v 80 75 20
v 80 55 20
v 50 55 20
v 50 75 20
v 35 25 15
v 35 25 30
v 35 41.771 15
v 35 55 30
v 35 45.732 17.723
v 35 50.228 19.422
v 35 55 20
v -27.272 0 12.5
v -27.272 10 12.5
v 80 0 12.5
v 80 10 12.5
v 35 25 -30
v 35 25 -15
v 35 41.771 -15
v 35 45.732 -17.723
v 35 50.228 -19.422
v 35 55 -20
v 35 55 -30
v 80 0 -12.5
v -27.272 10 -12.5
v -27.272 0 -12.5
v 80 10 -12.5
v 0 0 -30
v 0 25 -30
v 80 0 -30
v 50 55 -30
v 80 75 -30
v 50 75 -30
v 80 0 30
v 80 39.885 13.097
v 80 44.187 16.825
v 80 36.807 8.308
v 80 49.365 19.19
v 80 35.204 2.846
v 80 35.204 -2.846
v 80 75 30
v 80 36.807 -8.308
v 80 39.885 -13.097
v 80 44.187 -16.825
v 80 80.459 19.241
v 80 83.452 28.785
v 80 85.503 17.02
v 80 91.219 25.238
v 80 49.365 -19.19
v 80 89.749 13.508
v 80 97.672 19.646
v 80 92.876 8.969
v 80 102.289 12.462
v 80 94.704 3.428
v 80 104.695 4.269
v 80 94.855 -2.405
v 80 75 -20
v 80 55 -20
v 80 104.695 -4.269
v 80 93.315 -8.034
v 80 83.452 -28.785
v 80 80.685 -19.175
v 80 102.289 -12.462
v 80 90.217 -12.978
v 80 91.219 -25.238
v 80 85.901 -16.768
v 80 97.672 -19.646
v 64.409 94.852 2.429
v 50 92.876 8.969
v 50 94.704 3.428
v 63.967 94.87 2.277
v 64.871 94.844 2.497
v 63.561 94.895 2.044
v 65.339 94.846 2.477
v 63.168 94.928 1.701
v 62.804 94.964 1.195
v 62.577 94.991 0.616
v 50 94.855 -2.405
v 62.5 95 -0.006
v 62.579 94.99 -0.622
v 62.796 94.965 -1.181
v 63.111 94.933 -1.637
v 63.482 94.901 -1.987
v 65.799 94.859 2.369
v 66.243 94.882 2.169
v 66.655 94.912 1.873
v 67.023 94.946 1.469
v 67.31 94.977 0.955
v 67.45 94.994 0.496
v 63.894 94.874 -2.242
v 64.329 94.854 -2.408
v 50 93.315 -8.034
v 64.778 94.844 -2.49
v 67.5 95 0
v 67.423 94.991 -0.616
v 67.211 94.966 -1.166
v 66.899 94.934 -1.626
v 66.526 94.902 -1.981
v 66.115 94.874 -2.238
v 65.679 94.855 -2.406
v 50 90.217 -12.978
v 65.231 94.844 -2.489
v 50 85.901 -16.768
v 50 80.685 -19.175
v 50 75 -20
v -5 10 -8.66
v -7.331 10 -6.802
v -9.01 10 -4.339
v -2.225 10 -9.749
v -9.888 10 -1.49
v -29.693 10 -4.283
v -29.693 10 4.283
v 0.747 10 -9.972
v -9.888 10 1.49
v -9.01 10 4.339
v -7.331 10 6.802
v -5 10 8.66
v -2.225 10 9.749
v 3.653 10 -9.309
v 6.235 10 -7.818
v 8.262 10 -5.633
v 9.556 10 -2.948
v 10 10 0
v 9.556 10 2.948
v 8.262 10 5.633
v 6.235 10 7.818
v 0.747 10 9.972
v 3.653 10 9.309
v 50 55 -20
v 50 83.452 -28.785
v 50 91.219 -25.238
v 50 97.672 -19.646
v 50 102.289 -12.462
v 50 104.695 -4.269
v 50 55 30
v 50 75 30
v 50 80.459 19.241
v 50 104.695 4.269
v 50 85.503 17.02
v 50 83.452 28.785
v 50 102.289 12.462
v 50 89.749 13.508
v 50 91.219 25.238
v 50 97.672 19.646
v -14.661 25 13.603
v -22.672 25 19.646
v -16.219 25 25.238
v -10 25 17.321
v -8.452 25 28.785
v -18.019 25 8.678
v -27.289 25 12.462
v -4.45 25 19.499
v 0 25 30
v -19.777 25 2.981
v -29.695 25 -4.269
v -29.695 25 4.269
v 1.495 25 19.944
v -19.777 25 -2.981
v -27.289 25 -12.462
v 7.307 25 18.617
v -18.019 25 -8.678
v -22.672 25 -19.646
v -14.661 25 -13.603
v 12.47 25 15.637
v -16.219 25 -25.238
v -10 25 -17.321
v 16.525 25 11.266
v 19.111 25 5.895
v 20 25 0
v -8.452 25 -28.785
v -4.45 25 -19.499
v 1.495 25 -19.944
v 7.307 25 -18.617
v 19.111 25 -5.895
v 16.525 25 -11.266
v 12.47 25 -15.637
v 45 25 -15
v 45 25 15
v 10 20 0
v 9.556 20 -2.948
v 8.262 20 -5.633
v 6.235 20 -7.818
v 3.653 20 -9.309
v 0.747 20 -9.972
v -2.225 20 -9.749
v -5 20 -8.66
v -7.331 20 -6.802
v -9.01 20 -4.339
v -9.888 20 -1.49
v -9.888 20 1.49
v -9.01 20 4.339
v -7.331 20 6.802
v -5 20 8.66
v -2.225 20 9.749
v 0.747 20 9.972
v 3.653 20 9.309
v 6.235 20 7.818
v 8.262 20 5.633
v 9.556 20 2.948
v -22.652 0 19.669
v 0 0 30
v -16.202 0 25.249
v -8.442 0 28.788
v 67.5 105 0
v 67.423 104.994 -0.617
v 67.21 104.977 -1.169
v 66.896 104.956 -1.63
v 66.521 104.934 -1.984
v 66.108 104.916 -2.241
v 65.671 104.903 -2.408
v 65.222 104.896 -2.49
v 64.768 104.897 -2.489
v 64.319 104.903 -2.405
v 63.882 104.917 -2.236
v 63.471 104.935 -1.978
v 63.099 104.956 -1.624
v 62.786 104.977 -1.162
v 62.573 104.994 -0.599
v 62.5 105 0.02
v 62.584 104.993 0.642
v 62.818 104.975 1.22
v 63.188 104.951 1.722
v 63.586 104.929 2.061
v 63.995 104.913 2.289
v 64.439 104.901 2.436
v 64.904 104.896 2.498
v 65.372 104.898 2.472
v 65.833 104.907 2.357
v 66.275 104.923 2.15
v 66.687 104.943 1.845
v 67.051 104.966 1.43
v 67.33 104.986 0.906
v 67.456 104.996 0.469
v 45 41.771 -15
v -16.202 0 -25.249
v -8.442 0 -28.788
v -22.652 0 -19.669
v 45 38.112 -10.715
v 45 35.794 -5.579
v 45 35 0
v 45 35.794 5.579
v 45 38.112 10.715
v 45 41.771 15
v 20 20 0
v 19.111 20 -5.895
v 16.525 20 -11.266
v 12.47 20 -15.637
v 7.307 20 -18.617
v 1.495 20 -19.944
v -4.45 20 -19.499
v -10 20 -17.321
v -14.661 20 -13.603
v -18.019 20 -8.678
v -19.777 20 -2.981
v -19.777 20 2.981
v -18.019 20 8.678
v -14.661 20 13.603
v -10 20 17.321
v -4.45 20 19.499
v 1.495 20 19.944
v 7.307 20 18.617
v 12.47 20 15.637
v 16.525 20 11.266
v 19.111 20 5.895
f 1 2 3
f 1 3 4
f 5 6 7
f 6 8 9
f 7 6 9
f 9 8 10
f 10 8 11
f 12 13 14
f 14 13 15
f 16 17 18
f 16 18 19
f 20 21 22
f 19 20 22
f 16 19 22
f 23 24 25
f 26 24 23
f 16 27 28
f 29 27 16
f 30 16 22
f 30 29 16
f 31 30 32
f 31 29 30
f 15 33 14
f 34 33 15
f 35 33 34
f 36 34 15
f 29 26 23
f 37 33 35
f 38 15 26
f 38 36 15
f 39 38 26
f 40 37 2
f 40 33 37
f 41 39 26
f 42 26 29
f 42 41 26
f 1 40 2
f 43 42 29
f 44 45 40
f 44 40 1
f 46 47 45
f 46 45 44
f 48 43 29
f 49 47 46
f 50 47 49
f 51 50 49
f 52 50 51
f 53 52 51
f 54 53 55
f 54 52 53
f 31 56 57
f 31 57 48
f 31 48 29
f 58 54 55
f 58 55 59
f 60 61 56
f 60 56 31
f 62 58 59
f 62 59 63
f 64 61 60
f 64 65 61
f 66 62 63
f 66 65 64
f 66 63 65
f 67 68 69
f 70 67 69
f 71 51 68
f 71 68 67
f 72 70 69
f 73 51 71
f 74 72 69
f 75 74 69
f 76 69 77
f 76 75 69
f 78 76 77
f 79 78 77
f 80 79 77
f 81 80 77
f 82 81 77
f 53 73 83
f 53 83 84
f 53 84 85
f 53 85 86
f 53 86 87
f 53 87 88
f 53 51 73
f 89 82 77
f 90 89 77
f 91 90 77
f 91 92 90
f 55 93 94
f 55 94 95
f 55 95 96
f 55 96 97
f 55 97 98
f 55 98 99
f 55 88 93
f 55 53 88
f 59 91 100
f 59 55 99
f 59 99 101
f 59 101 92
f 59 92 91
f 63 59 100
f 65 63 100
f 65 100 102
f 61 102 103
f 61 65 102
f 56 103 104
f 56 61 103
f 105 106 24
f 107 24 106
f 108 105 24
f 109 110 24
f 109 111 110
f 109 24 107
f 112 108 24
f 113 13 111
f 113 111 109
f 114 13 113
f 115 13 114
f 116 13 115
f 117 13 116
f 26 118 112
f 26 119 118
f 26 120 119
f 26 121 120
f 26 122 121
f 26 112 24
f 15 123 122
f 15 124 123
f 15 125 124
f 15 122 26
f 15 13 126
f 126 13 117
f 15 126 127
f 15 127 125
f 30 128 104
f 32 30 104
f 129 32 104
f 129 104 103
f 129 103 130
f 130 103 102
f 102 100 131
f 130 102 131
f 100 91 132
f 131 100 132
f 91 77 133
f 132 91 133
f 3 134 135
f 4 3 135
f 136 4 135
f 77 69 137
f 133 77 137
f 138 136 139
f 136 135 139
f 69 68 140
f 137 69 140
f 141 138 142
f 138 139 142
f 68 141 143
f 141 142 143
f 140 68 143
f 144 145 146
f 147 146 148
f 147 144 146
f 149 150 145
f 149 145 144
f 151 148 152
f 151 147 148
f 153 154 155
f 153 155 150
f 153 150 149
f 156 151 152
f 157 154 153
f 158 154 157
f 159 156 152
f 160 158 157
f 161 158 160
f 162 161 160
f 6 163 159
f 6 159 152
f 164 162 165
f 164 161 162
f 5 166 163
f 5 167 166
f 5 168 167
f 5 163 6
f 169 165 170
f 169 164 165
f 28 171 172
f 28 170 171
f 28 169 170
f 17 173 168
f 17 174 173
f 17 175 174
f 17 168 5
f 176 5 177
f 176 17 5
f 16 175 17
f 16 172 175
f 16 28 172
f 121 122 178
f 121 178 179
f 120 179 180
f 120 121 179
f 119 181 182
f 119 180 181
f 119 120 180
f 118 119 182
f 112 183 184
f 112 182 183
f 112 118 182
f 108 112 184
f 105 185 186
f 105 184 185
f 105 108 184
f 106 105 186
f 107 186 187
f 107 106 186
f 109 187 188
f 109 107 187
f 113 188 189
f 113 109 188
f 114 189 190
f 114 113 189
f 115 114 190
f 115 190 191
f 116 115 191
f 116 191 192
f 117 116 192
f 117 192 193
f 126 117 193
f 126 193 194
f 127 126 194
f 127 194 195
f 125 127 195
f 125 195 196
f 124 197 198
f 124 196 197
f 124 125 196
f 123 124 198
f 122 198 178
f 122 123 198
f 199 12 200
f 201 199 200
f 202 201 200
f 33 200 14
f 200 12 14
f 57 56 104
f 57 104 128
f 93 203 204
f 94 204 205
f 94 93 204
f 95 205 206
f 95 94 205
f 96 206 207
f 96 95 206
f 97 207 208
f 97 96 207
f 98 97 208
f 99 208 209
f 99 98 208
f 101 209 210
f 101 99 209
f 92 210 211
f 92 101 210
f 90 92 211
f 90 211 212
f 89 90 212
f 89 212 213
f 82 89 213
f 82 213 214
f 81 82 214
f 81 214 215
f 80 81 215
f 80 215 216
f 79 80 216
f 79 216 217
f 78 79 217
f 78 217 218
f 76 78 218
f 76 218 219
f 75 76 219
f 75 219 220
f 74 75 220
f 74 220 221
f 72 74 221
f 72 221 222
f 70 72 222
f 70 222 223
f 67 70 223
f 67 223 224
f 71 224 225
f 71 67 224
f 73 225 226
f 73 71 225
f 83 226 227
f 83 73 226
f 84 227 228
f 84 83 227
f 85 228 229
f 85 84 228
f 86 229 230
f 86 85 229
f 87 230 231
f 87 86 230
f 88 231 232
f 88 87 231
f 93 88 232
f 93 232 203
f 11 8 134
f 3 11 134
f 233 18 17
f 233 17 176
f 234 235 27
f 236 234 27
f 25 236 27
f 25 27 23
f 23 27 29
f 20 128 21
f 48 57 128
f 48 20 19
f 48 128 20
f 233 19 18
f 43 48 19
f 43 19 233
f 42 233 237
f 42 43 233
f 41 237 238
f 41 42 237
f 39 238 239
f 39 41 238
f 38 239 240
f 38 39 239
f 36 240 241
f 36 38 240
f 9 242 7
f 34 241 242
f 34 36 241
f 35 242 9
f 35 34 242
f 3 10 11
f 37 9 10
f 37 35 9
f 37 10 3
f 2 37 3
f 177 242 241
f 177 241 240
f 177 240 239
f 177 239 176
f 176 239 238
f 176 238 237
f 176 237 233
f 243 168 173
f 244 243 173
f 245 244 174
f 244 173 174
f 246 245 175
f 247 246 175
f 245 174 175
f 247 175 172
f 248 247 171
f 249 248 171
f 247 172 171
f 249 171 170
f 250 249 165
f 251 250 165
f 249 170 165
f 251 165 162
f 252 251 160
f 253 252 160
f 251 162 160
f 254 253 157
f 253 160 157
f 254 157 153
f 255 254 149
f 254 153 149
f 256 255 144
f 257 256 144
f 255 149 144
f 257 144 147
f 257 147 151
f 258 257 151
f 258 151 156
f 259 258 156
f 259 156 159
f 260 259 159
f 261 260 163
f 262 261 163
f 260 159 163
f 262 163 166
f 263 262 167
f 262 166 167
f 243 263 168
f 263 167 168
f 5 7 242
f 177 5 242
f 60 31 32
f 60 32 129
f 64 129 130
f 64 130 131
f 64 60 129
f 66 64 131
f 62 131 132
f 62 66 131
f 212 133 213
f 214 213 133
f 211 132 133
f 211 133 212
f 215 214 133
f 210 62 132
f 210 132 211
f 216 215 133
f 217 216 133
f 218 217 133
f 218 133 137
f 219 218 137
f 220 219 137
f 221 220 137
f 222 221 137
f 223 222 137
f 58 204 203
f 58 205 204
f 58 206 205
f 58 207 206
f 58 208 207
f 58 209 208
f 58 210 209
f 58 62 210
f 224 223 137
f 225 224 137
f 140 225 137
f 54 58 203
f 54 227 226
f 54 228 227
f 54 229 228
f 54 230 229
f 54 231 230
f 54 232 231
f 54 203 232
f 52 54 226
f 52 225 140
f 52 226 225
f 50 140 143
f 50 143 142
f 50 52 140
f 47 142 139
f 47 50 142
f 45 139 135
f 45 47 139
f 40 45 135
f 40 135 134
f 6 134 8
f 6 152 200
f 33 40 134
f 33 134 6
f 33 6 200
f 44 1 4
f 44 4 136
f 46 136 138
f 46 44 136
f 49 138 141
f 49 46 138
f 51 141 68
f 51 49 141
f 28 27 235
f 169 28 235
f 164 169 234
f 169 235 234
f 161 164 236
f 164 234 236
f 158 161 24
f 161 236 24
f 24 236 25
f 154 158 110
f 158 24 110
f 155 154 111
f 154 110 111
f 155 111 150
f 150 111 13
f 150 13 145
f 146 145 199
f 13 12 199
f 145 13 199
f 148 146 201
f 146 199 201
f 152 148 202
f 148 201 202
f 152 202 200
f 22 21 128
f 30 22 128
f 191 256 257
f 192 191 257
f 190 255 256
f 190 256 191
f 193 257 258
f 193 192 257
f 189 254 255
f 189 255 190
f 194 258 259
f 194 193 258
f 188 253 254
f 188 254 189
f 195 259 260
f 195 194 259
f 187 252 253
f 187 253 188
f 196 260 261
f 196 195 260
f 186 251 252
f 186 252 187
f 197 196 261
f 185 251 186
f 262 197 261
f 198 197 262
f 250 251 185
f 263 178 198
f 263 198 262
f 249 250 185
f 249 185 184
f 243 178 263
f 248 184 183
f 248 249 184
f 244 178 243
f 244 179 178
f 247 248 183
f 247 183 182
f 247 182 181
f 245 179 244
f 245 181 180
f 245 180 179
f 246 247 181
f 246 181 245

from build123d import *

# Parameters (mm, degrees)
SKETCH1_R               = 10
BOSS_EXTRUDE1_DEPTH     = 25
BOSS_EXTRUDE2_DEPTH     = 45
SKETCH4_W               = 110
SKETCH4_H               = 10
CUT_EXTRUDE1_DEPTH      = 12.5
SKETCH5_W               = 15
SKETCH5_H               = 50
CUT_EXTRUDE2_DEPTH      = 32.5
SKETCH6_W               = 10
SKETCH6_H               = 30
CUT_EXTRUDE3_DEPTH      = 65
CUT_EXTRUDE3_DEPTH_BACK = 30
SKETCH7_R               = 20
CUT_EXTRUDE4_DEPTH      = 5
SKETCH9_R               = 2.5
CUT_EXTRUDE5_DEPTH      = 55


with BuildPart() as part:
    # Sketch1 → Boss-Extrude1 (new body)
    with BuildSketch(Plane(origin=(0, 0, 0), x_dir=(1, 0, 0), z_dir=(0, 1, 0))):
        with BuildLine():
            Line((0, -30), (80, -30))
            Line((80, -30), (80, 30))
            Line((80, 30), (0, 30))
            ThreePointArc((0, 30), (-30, 0), (0, -30))
        make_face()
        Circle(SKETCH1_R, mode=Mode.SUBTRACT)
    extrude(amount=BOSS_EXTRUDE1_DEPTH)

    # Sketch2 → Boss-Extrude2 (add)
    with BuildSketch(Plane(origin=(80, 0, 0), x_dir=(0, 0, -1), z_dir=(1, 0, 0))):
        with BuildLine():
            Line((-30, 25), (30, 25))
            Line((30, 25), (30, 75))
            Line((30, 75), (20, 75))
            Line((20, 75), (20, 55))
            ThreePointArc((20, 55), (0, 35), (-20, 55))
            Line((-20, 55), (-20, 75))
            Line((-20, 75), (-30, 75))
            Line((-30, 75), (-30, 25))
        make_face()
        with BuildLine():
            Line((20, 75), (30, 75))
            ThreePointArc((30, 75), (0, 105), (-30, 75))
            Line((-30, 75), (-20, 75))
            ThreePointArc((-20, 75), (-17.020295968, 85.502834149), (-8.969047485, 92.876134572))
            ThreePointArc((-8.969047485, 92.876134572), (2.405486487, 94.854813894), (12.978420983, 90.217114995))
            ThreePointArc((12.978420983, 90.217114995), (18.159961724, 83.379486271), (20, 75))
        make_face()
    extrude(amount=-BOSS_EXTRUDE2_DEPTH)

    # Sketch4 → Cut-Extrude1 (cut, symmetric)
    with BuildSketch(Plane.XY):
        with Locations((25, 5)):
            Rectangle(SKETCH4_W, SKETCH4_H)
    extrude(amount=CUT_EXTRUDE1_DEPTH, both=True, mode=Mode.SUBTRACT)

    # Sketch5 → Cut-Extrude2 (cut, symmetric)
    with BuildSketch(Plane.XY):
        with Locations((42.5, 80)):
            Rectangle(SKETCH5_W, SKETCH5_H)
    extrude(amount=CUT_EXTRUDE2_DEPTH, both=True, mode=Mode.SUBTRACT)

    # Sketch6 → Cut-Extrude3 (cut, two sides)
    with BuildSketch(Plane(origin=(0, 55, 0), x_dir=(1, 0, 0), z_dir=(0, 1, 0))) as cut_extrude3_sk:
        with Locations((40, 0)):
            Rectangle(SKETCH6_W, SKETCH6_H)
    extrude(amount=CUT_EXTRUDE3_DEPTH, mode=Mode.SUBTRACT)
    extrude(cut_extrude3_sk.sketch, amount=-CUT_EXTRUDE3_DEPTH_BACK, mode=Mode.SUBTRACT)

    # Sketch7 → Cut-Extrude4 (cut)
    with BuildSketch(Plane(origin=(0, 25, 0), x_dir=(1, 0, 0), z_dir=(0, 1, 0))):
        Circle(SKETCH7_R)
    extrude(amount=-CUT_EXTRUDE4_DEPTH, mode=Mode.SUBTRACT)

    # Sketch9 → Cut-Extrude5 (cut)
    with BuildSketch(Plane(origin=(0, 55, 0), x_dir=(1, 0, 0), z_dir=(0, 1, 0))):
        with Locations((65, 0)):
            Circle(SKETCH9_R)
    extrude(amount=CUT_EXTRUDE5_DEPTH, mode=Mode.SUBTRACT)


solid = part.part
